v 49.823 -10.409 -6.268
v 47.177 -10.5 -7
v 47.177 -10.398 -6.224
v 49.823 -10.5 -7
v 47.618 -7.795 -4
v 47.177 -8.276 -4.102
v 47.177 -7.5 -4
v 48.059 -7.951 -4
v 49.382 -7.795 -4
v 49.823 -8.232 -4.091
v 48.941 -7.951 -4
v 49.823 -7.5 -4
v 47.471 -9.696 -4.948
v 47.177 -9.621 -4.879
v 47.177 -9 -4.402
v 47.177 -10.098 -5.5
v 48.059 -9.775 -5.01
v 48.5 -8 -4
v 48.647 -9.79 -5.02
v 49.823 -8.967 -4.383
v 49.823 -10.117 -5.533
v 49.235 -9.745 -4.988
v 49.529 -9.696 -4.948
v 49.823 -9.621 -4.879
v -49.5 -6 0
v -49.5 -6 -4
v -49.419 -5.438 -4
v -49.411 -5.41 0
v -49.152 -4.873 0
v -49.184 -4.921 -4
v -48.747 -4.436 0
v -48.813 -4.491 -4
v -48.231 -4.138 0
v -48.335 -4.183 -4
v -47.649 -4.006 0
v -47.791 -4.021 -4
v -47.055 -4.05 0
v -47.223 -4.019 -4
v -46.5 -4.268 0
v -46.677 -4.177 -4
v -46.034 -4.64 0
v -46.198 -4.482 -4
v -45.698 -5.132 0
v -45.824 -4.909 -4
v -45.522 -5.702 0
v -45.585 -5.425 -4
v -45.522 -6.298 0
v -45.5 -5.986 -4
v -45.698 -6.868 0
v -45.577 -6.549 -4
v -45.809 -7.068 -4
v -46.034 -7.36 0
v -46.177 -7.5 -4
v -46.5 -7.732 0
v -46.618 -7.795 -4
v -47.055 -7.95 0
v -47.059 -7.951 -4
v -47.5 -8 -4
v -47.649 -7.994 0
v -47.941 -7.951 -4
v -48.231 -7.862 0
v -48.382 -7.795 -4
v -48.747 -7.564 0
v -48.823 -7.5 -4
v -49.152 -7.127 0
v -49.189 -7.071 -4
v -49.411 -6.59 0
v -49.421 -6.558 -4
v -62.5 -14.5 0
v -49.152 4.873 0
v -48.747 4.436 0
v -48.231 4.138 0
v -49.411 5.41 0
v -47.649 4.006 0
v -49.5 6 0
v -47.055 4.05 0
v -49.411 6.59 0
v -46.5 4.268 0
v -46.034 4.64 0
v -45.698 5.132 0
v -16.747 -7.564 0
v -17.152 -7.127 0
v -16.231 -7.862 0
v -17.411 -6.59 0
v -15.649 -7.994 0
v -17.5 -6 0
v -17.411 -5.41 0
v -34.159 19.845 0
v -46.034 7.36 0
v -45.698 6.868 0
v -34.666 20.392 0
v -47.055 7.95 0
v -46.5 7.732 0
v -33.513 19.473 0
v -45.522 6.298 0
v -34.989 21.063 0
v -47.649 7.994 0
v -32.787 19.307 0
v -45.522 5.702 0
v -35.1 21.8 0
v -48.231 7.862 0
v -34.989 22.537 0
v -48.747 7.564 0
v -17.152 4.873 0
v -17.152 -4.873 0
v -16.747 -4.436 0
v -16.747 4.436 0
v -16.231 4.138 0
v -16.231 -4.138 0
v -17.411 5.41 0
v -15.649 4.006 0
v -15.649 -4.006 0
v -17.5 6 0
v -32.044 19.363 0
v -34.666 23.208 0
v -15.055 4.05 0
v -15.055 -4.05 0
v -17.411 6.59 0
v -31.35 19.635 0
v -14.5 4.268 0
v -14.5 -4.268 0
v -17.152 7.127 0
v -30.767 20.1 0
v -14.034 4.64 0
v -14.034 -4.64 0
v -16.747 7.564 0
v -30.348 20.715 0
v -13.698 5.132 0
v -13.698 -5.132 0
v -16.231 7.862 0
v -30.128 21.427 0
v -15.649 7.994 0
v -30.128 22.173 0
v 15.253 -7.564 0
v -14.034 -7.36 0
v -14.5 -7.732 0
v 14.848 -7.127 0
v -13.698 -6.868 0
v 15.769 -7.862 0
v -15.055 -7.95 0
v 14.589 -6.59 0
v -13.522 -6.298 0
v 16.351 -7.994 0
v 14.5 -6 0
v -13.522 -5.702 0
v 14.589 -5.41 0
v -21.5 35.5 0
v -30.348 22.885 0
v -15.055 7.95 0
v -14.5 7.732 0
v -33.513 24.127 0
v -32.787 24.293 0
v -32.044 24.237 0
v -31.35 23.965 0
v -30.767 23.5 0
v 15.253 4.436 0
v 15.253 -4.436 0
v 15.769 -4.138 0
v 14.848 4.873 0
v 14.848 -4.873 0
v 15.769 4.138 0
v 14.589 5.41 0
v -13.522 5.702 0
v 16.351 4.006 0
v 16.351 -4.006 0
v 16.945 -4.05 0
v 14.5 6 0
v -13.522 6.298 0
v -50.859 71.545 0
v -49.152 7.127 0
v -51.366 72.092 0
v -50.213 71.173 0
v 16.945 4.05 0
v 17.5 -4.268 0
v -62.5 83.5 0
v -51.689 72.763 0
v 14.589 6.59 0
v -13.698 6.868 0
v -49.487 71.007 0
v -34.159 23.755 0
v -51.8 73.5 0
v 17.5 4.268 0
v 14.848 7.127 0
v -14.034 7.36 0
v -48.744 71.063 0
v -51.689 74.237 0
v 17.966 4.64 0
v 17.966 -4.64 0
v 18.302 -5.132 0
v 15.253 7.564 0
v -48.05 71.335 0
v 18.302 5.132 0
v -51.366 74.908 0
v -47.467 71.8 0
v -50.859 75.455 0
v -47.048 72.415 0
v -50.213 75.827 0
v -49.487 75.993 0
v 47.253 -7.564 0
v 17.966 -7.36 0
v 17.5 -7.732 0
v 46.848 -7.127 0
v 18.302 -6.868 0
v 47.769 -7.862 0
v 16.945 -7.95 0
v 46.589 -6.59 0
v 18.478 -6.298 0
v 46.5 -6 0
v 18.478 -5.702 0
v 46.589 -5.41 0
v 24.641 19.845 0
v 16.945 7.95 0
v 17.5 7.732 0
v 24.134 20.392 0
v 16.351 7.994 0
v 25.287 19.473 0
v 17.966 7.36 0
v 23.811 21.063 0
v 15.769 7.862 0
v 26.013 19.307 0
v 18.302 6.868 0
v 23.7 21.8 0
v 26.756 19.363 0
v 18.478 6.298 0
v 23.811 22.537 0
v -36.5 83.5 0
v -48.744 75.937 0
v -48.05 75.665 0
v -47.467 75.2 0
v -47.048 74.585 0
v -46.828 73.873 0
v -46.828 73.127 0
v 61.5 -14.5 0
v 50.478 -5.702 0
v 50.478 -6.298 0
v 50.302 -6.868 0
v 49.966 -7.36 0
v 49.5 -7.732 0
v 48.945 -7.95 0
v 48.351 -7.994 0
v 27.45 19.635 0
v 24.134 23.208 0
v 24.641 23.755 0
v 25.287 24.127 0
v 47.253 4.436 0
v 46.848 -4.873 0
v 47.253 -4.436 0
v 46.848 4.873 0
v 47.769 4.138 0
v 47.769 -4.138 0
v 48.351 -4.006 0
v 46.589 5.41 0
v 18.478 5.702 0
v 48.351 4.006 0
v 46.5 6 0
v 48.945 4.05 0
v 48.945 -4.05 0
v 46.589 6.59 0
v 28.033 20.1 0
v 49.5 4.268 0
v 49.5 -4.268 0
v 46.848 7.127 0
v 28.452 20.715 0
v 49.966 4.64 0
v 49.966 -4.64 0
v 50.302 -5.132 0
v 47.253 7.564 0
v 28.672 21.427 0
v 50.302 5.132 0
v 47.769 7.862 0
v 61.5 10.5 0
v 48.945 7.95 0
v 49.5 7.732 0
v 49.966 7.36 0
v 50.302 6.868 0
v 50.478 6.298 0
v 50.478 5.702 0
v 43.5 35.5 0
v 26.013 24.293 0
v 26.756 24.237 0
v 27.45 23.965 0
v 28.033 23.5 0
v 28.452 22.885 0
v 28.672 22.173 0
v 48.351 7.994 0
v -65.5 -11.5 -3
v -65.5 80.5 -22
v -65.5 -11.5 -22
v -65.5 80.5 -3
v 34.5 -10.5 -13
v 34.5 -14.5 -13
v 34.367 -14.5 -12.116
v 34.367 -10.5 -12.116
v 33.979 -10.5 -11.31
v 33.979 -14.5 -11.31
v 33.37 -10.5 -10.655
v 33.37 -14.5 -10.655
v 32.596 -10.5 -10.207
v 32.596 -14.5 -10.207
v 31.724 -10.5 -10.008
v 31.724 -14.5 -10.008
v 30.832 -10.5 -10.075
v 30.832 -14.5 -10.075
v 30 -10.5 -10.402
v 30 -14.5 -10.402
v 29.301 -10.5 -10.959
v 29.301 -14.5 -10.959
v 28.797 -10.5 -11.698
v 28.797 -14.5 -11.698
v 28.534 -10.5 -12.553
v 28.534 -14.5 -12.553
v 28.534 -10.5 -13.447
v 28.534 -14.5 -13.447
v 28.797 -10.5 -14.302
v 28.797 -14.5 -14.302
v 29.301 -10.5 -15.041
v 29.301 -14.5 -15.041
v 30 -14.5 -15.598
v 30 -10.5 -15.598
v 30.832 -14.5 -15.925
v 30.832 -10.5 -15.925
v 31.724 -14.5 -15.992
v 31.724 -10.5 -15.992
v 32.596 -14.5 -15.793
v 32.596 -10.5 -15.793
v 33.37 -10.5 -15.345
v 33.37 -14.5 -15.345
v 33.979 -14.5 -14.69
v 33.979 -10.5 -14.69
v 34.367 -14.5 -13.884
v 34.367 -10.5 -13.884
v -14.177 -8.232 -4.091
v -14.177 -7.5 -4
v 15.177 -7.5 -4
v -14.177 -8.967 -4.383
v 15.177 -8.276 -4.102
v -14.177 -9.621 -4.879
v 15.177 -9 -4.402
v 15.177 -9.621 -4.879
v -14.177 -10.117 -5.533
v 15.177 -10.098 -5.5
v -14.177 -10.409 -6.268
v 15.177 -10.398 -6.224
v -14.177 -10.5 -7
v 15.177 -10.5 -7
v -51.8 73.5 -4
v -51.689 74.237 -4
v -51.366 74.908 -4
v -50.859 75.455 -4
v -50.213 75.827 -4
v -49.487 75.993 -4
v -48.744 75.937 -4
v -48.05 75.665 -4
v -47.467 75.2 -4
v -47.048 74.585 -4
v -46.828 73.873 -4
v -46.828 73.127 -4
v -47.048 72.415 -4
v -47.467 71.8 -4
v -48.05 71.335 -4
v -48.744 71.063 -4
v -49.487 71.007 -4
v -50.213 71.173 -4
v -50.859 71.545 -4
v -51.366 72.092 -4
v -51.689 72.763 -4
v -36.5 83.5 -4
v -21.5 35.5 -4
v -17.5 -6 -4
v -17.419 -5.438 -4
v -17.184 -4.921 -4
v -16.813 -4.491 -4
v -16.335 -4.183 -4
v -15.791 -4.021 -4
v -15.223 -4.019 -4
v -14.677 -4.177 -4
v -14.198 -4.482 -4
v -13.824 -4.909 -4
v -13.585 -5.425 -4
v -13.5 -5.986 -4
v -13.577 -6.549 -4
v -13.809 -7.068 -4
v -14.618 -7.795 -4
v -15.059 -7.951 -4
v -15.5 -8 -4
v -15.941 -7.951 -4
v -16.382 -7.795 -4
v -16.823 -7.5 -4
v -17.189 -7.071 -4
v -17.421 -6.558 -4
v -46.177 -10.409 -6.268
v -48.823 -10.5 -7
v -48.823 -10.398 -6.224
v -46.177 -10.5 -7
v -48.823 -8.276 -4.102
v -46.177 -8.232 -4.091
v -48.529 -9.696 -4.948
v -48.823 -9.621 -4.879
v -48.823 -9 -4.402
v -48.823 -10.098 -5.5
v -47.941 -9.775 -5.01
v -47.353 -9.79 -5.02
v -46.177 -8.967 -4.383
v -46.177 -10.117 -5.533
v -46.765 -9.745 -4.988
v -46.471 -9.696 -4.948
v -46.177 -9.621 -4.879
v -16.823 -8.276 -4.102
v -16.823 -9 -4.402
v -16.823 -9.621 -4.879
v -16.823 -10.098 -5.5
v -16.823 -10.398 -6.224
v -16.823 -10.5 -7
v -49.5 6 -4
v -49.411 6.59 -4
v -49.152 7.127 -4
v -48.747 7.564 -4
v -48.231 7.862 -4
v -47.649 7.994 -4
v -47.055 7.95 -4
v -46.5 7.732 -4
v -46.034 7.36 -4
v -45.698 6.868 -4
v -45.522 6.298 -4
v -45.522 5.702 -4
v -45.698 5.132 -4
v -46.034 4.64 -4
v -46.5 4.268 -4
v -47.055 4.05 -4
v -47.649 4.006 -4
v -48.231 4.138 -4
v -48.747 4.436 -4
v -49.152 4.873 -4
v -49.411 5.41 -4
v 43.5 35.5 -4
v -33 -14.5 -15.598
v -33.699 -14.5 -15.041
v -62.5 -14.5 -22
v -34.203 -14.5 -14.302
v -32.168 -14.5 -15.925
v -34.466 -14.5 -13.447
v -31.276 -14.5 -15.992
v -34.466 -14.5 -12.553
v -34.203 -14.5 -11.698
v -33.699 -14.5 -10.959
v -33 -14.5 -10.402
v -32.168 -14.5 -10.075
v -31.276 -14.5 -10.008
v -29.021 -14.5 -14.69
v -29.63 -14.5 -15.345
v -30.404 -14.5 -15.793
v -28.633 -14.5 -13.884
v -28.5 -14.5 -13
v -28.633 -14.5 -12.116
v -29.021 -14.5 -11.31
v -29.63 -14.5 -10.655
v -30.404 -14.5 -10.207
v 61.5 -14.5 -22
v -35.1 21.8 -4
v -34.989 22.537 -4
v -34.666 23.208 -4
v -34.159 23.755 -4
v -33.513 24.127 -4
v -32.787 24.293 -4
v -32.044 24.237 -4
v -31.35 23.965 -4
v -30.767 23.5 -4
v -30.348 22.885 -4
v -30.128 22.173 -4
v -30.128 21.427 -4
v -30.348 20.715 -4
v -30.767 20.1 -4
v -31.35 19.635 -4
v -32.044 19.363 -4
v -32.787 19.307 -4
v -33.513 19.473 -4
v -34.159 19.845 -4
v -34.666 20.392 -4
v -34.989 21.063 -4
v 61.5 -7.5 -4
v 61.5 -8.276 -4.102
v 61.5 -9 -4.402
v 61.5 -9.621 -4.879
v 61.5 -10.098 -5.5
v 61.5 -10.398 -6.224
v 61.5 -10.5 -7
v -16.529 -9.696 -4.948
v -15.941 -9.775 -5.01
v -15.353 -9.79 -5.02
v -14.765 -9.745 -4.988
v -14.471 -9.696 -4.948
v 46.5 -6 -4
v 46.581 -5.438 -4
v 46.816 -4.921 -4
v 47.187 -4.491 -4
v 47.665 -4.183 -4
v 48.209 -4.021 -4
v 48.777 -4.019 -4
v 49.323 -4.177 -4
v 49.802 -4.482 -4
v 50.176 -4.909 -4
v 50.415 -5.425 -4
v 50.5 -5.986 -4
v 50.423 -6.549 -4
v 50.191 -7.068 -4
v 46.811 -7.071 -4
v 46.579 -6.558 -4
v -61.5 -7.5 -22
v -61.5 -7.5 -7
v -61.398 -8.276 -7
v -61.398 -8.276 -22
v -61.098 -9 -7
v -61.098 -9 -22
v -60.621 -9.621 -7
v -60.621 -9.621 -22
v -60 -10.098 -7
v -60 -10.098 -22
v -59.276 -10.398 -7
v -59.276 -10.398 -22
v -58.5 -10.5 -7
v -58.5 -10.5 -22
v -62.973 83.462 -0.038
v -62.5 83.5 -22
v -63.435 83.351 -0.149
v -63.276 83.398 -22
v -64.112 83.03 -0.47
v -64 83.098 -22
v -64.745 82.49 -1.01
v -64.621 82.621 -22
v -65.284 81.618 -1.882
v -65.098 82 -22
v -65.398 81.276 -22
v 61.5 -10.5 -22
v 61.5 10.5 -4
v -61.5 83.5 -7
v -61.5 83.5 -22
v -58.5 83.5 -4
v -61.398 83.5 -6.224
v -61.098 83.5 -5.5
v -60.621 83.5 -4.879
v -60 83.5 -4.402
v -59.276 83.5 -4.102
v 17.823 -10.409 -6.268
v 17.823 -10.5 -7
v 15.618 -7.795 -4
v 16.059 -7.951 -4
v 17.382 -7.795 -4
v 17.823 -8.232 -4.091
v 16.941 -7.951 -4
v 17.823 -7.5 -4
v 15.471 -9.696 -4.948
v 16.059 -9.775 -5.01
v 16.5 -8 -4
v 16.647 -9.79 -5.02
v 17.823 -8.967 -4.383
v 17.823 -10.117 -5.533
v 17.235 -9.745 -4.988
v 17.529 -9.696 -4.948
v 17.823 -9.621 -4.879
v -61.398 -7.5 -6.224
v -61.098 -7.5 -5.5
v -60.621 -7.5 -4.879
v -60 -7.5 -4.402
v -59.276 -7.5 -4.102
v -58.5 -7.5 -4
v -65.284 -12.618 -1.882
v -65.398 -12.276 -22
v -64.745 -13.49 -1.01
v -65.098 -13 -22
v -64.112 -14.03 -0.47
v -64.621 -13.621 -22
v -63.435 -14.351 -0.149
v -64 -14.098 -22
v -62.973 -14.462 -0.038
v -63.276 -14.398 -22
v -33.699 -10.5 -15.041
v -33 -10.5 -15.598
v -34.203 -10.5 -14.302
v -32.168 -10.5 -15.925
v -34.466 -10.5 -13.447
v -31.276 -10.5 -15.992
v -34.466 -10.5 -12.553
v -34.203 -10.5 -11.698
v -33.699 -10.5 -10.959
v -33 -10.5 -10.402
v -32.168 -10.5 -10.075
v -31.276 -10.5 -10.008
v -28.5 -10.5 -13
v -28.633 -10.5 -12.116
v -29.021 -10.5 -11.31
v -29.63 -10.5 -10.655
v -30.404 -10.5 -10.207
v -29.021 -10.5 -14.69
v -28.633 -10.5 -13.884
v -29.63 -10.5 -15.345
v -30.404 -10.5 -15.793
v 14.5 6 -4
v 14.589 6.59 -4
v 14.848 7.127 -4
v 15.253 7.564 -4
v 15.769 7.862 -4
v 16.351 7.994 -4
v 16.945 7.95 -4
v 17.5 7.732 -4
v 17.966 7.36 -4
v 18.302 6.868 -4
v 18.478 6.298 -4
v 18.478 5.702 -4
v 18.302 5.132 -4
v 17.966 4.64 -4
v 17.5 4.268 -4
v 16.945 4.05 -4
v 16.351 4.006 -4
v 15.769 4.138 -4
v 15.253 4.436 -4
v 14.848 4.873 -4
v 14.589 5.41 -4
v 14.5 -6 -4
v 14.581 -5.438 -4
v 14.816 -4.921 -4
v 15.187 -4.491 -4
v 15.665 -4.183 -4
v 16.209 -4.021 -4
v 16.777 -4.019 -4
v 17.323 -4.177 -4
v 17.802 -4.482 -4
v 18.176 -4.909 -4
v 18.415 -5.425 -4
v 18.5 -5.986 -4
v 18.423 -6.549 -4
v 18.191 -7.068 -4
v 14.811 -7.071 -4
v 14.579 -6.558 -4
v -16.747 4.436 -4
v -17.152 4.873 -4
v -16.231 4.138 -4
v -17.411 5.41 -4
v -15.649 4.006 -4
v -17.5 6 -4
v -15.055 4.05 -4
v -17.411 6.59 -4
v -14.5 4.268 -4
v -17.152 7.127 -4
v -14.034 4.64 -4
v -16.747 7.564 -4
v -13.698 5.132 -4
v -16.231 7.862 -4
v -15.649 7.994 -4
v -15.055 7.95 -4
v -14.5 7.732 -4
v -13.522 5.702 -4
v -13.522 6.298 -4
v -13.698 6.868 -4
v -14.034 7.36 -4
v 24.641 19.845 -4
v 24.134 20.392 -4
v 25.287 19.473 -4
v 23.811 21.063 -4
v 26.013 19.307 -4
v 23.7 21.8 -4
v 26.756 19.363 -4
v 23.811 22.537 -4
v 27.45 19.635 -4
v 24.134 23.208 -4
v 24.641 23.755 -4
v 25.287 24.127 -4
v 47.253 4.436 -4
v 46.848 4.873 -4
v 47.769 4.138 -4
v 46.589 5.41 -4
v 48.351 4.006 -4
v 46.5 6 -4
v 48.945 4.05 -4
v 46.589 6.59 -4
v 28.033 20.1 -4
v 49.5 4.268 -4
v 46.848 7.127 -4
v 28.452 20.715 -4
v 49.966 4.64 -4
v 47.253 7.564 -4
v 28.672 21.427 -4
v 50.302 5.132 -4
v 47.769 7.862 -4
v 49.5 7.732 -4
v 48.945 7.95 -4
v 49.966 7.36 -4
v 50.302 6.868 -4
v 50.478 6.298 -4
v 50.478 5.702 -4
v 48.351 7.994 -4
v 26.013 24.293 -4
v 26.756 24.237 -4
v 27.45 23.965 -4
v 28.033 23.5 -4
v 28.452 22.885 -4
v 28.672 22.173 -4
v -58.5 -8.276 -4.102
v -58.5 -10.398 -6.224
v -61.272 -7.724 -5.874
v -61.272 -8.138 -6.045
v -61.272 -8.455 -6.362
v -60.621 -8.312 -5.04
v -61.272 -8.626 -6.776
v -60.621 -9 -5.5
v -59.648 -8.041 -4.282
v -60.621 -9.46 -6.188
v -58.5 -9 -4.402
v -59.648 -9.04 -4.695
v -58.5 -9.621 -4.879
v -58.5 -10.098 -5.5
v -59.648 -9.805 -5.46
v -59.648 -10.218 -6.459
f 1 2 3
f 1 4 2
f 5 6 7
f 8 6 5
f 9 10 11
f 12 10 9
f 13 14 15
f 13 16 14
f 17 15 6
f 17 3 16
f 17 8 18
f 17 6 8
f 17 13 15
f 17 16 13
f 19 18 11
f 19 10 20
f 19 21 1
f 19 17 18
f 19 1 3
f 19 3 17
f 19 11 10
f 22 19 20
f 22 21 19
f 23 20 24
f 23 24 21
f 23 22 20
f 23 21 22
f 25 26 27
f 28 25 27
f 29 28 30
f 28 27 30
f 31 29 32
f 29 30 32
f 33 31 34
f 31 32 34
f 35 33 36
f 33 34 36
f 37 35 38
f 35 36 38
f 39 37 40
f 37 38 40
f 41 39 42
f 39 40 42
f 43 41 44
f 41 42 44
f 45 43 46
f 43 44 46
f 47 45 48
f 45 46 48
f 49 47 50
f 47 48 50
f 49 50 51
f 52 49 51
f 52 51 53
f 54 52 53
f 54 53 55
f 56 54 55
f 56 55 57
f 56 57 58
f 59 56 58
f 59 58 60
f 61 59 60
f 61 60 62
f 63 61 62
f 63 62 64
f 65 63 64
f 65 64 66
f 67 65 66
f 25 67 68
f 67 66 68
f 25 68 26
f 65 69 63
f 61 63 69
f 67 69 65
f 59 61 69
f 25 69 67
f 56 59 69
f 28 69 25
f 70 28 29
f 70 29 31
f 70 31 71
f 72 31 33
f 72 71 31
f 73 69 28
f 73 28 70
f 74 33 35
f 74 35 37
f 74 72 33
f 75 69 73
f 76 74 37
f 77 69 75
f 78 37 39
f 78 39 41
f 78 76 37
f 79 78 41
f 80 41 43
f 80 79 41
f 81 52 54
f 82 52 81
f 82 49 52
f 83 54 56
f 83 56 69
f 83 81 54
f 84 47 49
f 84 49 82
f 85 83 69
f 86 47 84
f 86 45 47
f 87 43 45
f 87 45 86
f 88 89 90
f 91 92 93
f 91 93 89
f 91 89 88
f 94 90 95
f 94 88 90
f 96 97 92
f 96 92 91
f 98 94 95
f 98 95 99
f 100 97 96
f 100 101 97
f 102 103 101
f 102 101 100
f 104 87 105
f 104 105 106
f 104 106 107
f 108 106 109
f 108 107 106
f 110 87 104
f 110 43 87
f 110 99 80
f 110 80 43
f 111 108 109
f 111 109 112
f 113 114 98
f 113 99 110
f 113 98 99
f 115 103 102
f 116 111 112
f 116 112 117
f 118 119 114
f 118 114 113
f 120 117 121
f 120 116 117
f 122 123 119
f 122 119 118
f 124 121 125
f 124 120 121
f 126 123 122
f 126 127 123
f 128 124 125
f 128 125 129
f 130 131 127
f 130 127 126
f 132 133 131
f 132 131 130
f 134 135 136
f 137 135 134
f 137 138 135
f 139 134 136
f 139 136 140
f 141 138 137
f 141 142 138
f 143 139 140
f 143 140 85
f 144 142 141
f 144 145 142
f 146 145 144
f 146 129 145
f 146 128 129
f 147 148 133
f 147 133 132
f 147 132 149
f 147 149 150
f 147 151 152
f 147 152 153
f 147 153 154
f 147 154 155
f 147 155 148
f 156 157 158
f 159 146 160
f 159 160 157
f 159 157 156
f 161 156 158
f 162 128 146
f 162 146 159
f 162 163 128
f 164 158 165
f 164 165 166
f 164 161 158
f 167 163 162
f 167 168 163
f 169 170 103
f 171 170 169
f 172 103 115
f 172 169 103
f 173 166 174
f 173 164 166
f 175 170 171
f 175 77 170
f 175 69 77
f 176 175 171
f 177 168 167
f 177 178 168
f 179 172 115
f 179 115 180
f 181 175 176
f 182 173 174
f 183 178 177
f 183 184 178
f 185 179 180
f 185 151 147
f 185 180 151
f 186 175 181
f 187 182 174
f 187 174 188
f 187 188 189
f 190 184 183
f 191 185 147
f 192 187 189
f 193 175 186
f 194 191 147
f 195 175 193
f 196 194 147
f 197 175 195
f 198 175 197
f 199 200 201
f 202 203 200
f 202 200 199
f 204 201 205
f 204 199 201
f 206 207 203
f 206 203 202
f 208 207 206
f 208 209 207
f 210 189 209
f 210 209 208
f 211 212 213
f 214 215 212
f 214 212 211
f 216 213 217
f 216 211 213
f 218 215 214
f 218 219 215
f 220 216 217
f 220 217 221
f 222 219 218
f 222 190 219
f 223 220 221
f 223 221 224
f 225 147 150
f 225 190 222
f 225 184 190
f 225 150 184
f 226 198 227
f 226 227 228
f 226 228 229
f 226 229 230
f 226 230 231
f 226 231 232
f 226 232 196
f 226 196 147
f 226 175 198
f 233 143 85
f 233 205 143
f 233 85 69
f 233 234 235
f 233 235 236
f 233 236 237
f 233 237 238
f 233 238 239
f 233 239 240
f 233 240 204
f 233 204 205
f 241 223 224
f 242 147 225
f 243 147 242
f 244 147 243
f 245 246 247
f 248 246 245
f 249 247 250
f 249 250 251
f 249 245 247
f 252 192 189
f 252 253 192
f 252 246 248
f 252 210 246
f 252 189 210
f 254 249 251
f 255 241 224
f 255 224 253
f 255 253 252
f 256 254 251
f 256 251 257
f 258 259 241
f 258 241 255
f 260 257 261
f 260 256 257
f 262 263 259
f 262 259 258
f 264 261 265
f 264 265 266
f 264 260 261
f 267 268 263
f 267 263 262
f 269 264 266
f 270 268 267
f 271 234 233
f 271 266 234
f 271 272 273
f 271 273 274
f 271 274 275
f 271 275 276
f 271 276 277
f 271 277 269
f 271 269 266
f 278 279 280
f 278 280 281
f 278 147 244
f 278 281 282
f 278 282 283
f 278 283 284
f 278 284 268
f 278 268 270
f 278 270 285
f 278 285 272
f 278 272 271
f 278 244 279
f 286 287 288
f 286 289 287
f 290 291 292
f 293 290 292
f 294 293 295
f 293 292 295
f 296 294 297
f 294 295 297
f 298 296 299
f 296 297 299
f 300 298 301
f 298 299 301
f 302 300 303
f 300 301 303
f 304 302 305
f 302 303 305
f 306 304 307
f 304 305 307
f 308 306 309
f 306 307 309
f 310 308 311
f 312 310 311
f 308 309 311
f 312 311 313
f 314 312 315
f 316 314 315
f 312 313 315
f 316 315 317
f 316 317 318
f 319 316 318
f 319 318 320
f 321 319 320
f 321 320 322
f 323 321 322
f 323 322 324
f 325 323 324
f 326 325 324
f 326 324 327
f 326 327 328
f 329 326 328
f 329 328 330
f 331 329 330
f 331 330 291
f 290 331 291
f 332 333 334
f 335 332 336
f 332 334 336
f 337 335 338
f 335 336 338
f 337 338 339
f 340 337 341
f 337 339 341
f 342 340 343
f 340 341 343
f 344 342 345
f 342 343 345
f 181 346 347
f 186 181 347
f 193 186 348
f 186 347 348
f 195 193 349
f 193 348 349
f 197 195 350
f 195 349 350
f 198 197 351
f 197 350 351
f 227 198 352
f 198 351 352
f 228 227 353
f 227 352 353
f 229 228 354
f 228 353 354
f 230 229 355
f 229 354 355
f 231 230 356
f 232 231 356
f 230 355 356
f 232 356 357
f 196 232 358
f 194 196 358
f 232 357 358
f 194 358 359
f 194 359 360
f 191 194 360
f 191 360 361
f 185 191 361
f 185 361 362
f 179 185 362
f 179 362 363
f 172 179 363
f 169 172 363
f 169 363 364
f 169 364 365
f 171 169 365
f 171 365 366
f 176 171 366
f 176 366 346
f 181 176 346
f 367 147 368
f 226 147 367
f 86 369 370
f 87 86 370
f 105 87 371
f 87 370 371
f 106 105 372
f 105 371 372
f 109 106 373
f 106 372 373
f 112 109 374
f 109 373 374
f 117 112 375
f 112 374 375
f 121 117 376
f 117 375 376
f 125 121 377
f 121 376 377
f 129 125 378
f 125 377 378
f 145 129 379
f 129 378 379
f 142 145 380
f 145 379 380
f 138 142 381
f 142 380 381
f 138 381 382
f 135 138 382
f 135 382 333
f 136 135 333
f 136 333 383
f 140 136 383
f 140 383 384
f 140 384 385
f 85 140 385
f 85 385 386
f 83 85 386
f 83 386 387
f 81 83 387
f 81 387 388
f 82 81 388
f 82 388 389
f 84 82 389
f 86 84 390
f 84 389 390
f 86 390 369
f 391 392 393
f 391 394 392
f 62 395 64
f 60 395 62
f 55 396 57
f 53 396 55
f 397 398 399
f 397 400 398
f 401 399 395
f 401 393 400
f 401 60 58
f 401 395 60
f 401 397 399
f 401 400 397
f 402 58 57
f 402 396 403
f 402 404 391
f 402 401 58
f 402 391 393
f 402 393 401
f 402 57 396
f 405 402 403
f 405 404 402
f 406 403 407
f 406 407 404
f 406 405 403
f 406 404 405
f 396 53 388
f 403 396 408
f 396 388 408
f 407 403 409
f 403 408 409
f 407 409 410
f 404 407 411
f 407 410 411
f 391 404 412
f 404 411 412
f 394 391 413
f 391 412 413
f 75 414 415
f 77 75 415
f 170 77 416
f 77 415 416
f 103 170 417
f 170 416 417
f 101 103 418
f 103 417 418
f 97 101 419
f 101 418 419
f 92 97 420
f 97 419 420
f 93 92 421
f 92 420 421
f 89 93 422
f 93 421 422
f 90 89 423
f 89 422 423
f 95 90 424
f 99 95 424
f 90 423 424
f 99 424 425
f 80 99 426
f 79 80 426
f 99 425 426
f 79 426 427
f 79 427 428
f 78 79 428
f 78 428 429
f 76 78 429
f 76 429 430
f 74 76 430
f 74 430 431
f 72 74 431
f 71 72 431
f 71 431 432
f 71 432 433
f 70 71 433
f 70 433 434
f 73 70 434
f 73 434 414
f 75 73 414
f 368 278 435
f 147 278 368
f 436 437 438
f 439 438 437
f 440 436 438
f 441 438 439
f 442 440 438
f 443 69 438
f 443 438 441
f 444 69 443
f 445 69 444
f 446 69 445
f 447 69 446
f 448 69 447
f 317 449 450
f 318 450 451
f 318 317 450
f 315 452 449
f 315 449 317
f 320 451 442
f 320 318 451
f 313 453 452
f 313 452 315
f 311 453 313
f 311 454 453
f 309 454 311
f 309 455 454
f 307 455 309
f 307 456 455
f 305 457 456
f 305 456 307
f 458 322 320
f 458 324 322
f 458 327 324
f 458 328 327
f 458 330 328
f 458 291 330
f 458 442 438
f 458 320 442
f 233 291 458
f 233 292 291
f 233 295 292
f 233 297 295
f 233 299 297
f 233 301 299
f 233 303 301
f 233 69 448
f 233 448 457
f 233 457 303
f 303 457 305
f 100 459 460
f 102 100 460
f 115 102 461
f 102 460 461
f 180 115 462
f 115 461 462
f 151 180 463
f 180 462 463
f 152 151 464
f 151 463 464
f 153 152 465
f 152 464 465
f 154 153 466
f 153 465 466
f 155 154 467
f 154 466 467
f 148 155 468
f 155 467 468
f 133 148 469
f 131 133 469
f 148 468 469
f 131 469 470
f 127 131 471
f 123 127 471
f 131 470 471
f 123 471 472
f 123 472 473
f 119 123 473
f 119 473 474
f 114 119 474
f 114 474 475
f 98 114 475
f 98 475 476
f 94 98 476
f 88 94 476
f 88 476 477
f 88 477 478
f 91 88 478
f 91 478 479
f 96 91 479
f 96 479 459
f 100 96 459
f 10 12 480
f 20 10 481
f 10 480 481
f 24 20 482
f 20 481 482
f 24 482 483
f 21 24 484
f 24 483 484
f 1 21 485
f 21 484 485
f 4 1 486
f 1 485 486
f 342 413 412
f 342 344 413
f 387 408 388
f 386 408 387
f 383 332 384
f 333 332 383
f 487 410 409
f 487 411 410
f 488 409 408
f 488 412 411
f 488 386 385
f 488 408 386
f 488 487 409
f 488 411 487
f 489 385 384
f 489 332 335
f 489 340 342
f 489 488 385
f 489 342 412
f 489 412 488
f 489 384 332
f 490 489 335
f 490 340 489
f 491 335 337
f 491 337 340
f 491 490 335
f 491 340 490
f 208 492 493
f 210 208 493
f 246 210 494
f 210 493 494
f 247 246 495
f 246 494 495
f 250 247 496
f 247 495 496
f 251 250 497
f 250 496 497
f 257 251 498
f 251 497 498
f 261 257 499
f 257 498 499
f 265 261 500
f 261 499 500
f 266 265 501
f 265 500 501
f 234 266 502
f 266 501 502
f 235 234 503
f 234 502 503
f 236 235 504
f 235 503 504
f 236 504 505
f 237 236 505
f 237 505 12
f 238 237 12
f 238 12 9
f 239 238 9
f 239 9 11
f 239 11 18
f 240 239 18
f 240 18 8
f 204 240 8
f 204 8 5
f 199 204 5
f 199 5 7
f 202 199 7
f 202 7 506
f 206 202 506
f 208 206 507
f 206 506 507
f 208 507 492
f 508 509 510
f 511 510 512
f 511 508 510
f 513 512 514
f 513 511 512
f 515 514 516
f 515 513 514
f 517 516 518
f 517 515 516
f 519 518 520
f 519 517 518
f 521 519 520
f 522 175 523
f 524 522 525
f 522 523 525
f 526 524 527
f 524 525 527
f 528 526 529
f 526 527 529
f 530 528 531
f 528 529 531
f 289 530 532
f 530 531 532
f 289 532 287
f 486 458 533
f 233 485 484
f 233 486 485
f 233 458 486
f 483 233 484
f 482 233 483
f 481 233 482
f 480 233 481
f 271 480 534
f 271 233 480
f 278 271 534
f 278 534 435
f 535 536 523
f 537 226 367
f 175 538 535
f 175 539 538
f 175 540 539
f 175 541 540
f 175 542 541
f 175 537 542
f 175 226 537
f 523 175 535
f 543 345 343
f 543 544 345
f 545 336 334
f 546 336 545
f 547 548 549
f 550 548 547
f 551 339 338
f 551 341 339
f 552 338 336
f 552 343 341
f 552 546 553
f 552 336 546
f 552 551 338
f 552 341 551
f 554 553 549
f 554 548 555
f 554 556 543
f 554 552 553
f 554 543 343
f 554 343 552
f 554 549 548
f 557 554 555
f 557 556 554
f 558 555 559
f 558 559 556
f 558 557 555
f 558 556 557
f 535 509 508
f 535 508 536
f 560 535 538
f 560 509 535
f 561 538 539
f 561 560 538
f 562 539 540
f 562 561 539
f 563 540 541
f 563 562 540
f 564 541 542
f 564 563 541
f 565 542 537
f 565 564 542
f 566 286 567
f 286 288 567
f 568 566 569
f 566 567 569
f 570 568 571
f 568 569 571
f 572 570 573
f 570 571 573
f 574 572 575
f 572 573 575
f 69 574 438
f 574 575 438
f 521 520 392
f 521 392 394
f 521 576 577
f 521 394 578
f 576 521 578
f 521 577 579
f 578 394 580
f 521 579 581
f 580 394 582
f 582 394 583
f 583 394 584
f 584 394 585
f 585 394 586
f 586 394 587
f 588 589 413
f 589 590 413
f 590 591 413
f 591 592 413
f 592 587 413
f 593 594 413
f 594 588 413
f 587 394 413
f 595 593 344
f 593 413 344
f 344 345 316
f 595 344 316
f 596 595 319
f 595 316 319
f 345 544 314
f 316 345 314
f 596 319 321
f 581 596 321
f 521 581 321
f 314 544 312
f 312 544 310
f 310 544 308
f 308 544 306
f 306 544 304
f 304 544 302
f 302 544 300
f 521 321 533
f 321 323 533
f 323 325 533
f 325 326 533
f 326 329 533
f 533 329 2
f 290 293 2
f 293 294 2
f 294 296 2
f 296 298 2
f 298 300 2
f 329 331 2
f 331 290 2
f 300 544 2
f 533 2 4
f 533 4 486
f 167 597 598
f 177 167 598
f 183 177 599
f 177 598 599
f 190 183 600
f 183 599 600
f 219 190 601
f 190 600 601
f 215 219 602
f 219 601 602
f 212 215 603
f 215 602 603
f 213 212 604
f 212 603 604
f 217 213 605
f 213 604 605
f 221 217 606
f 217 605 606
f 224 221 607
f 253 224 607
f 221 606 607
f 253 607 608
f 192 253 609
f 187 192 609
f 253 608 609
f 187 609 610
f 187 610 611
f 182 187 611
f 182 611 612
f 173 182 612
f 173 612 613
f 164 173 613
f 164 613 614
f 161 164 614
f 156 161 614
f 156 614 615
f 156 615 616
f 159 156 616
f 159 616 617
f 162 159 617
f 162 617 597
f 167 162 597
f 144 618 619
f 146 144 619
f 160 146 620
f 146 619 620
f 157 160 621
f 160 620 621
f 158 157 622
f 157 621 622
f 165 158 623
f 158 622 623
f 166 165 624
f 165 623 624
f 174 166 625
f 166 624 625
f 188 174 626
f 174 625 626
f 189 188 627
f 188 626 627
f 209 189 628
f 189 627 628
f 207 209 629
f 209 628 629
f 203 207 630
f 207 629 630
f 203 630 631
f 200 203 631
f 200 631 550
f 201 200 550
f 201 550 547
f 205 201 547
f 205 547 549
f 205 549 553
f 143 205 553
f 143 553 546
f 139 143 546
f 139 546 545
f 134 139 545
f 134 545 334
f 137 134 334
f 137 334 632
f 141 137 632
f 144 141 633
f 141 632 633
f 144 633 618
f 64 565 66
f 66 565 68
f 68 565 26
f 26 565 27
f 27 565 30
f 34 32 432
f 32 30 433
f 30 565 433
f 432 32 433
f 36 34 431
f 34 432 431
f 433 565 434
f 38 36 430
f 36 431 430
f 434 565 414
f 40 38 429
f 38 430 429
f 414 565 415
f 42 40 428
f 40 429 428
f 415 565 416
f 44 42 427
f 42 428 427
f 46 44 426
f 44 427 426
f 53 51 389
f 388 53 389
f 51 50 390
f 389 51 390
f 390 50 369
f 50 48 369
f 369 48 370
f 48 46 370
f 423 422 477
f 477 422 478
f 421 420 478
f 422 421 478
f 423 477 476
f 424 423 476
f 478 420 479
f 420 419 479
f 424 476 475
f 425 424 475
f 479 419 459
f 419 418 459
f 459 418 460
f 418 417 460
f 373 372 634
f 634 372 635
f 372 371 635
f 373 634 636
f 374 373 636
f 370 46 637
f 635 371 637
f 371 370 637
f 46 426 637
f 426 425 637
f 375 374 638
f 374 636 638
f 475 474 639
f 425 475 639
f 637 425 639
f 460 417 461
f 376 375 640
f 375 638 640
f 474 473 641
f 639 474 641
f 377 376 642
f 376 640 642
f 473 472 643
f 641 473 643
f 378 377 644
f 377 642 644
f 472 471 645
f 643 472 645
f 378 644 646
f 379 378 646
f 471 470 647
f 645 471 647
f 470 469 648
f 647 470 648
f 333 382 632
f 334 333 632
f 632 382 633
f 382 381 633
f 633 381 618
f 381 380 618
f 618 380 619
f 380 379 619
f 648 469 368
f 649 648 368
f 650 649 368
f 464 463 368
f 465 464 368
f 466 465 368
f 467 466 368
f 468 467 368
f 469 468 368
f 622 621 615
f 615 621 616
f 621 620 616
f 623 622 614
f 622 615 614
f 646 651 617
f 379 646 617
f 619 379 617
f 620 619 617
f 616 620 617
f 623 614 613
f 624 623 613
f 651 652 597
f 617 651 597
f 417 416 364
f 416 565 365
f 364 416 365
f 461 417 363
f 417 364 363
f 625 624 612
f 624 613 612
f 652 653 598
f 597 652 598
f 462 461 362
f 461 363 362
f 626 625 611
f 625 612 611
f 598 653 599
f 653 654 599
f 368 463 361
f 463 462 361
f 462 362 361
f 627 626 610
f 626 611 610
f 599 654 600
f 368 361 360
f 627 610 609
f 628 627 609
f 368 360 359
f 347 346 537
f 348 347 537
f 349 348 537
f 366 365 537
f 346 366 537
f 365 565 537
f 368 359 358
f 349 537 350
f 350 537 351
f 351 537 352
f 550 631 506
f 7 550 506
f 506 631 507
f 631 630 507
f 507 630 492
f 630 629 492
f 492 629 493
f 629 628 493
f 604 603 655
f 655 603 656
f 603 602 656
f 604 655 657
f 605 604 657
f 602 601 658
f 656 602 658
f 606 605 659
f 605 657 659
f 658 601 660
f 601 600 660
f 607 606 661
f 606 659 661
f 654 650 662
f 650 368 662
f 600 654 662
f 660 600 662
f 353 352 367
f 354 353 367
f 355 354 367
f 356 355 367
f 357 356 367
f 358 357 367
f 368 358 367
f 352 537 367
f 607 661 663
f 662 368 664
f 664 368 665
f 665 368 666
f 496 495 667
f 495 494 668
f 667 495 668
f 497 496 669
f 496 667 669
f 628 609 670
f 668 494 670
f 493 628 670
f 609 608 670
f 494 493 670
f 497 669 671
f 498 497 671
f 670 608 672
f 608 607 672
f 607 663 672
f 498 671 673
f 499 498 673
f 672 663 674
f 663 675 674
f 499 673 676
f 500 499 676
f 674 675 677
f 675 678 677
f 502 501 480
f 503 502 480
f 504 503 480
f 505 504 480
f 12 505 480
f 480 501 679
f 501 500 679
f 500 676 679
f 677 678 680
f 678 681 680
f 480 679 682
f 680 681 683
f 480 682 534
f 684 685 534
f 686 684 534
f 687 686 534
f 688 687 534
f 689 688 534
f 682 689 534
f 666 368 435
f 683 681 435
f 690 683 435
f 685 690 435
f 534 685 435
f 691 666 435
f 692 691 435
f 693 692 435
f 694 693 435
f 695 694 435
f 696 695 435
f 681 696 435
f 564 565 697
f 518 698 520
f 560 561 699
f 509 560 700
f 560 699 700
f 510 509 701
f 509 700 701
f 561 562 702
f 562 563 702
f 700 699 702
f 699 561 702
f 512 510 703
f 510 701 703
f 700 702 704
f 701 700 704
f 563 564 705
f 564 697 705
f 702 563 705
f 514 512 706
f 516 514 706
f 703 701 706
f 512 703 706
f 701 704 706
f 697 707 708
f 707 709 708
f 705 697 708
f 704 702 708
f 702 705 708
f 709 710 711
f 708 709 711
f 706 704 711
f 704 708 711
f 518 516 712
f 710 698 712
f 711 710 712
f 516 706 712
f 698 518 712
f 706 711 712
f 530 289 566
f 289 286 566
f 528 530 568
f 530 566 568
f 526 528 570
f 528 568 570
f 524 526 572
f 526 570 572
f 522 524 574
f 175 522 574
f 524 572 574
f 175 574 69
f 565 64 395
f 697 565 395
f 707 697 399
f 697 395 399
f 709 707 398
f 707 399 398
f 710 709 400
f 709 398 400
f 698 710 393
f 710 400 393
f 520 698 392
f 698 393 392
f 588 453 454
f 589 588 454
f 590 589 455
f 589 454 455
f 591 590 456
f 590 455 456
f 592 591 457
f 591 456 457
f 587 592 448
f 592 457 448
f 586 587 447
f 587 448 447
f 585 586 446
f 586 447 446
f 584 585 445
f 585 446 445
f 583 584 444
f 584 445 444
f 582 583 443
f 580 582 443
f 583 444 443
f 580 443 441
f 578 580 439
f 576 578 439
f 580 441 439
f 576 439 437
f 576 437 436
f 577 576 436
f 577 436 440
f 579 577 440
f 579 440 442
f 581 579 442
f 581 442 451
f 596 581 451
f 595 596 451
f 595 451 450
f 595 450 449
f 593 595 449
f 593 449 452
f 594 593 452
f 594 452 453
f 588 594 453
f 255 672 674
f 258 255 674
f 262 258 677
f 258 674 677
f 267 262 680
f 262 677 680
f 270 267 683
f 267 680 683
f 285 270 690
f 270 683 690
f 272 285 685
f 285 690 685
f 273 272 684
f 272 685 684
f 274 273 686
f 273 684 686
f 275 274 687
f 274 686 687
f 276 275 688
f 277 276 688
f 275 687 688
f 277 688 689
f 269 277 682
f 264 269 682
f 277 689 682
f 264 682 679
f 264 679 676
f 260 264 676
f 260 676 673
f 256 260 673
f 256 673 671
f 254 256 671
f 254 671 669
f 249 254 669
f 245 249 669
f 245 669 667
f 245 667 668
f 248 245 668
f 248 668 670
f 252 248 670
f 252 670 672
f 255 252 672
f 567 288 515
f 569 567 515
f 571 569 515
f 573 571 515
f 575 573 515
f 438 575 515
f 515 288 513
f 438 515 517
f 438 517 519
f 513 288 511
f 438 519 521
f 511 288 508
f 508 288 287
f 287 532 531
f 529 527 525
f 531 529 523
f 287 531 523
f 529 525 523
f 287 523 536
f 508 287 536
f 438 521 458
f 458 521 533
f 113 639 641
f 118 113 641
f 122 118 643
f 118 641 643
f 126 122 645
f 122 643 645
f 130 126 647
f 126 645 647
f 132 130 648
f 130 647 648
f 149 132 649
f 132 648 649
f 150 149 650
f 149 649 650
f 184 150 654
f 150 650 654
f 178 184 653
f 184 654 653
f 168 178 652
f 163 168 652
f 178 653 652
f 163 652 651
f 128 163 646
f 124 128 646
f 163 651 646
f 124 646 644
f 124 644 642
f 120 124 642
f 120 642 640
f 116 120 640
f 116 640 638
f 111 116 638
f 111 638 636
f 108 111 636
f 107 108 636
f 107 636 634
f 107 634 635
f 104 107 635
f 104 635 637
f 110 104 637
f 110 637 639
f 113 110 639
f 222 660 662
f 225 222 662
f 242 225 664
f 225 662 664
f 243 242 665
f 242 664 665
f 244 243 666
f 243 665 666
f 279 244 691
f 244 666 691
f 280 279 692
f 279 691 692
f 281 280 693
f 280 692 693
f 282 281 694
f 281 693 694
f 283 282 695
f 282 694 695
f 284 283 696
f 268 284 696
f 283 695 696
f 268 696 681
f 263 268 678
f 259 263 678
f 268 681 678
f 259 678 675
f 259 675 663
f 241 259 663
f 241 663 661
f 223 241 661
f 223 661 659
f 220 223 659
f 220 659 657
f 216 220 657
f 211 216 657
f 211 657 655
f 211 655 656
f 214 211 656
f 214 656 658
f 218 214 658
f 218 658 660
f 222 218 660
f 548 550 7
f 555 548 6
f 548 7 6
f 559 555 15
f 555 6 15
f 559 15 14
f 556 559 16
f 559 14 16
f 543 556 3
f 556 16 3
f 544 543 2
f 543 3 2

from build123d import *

# Parameters (mm, degrees)
F0_W     = 123
F0_H     = 21
F1_DEPTH = 4
F0_H_2   = 4
F2_DEPTH = 22
F3_D     = 5
F4_D     = 4
F6_D     = 6
F7_R     = 3


with BuildPart() as f1:
    # F0 (on Top) → F1 (new body)
    with BuildSketch(Plane.XY):
        Rectangle(F0_W, F0_H)
        Polygon((-61.5, 10.5), (61.5, 10.5), (43.5, 35.5), (-21.5, 35.5), (-36.5, 83.5), (-61.5, 83.5), align=None)
    extrude(amount=-F1_DEPTH)

    # F0 (on Top) → F2 (join)
    with BuildSketch(Plane.XY):
        Polygon((-61.5, -14.5), (-61.5, -10.5), (-61.5, 10.5), (-61.5, 83.5), (-65.5, 83.5), (-65.5, -14.5), align=None)
        with Locations((0, -12.5)):
            Rectangle(F0_W, F0_H_2)
    extrude(amount=-F2_DEPTH)

    # F3 (through all)
    with Locations(Plane.XY):
        with Locations((-49.3, 73.5), (-32.6, 21.8), (26.2, 21.8)):
            Hole(F3_D / 2)

    # F4 (through all)
    with Locations(Plane.XY):
        with Locations((-47.5, 6), (-47.5, -6), (-15.5, -6), (-15.5, 6), (16.5, -6), (16.5, 6), (48.5, 6), (48.5, -6)):
            Hole(F4_D / 2)

    # F6 (through all)
    with Locations(Plane(origin=(0, -10.5, 0), x_dir=(-1, 0, 0), z_dir=(0, 1, 0))):
        with Locations((-31.5, -13), (31.5, -13)):
            Hole(F6_D / 2)

    # F7
    f7_edges = [f1.edges().sort_by_distance(p)[0] for p in [
        (0, -10.5, -4),
        (-61.5, 36.5, -4),
        (-61.5, -10.5, -13),
        (-65.5, -14.5, -11),
        (-65.5, 34.5, 0),
        (-65.5, 83.5, -11),
    ]]
    fillet(f7_edges, radius=F7_R)


solid = f1.part
